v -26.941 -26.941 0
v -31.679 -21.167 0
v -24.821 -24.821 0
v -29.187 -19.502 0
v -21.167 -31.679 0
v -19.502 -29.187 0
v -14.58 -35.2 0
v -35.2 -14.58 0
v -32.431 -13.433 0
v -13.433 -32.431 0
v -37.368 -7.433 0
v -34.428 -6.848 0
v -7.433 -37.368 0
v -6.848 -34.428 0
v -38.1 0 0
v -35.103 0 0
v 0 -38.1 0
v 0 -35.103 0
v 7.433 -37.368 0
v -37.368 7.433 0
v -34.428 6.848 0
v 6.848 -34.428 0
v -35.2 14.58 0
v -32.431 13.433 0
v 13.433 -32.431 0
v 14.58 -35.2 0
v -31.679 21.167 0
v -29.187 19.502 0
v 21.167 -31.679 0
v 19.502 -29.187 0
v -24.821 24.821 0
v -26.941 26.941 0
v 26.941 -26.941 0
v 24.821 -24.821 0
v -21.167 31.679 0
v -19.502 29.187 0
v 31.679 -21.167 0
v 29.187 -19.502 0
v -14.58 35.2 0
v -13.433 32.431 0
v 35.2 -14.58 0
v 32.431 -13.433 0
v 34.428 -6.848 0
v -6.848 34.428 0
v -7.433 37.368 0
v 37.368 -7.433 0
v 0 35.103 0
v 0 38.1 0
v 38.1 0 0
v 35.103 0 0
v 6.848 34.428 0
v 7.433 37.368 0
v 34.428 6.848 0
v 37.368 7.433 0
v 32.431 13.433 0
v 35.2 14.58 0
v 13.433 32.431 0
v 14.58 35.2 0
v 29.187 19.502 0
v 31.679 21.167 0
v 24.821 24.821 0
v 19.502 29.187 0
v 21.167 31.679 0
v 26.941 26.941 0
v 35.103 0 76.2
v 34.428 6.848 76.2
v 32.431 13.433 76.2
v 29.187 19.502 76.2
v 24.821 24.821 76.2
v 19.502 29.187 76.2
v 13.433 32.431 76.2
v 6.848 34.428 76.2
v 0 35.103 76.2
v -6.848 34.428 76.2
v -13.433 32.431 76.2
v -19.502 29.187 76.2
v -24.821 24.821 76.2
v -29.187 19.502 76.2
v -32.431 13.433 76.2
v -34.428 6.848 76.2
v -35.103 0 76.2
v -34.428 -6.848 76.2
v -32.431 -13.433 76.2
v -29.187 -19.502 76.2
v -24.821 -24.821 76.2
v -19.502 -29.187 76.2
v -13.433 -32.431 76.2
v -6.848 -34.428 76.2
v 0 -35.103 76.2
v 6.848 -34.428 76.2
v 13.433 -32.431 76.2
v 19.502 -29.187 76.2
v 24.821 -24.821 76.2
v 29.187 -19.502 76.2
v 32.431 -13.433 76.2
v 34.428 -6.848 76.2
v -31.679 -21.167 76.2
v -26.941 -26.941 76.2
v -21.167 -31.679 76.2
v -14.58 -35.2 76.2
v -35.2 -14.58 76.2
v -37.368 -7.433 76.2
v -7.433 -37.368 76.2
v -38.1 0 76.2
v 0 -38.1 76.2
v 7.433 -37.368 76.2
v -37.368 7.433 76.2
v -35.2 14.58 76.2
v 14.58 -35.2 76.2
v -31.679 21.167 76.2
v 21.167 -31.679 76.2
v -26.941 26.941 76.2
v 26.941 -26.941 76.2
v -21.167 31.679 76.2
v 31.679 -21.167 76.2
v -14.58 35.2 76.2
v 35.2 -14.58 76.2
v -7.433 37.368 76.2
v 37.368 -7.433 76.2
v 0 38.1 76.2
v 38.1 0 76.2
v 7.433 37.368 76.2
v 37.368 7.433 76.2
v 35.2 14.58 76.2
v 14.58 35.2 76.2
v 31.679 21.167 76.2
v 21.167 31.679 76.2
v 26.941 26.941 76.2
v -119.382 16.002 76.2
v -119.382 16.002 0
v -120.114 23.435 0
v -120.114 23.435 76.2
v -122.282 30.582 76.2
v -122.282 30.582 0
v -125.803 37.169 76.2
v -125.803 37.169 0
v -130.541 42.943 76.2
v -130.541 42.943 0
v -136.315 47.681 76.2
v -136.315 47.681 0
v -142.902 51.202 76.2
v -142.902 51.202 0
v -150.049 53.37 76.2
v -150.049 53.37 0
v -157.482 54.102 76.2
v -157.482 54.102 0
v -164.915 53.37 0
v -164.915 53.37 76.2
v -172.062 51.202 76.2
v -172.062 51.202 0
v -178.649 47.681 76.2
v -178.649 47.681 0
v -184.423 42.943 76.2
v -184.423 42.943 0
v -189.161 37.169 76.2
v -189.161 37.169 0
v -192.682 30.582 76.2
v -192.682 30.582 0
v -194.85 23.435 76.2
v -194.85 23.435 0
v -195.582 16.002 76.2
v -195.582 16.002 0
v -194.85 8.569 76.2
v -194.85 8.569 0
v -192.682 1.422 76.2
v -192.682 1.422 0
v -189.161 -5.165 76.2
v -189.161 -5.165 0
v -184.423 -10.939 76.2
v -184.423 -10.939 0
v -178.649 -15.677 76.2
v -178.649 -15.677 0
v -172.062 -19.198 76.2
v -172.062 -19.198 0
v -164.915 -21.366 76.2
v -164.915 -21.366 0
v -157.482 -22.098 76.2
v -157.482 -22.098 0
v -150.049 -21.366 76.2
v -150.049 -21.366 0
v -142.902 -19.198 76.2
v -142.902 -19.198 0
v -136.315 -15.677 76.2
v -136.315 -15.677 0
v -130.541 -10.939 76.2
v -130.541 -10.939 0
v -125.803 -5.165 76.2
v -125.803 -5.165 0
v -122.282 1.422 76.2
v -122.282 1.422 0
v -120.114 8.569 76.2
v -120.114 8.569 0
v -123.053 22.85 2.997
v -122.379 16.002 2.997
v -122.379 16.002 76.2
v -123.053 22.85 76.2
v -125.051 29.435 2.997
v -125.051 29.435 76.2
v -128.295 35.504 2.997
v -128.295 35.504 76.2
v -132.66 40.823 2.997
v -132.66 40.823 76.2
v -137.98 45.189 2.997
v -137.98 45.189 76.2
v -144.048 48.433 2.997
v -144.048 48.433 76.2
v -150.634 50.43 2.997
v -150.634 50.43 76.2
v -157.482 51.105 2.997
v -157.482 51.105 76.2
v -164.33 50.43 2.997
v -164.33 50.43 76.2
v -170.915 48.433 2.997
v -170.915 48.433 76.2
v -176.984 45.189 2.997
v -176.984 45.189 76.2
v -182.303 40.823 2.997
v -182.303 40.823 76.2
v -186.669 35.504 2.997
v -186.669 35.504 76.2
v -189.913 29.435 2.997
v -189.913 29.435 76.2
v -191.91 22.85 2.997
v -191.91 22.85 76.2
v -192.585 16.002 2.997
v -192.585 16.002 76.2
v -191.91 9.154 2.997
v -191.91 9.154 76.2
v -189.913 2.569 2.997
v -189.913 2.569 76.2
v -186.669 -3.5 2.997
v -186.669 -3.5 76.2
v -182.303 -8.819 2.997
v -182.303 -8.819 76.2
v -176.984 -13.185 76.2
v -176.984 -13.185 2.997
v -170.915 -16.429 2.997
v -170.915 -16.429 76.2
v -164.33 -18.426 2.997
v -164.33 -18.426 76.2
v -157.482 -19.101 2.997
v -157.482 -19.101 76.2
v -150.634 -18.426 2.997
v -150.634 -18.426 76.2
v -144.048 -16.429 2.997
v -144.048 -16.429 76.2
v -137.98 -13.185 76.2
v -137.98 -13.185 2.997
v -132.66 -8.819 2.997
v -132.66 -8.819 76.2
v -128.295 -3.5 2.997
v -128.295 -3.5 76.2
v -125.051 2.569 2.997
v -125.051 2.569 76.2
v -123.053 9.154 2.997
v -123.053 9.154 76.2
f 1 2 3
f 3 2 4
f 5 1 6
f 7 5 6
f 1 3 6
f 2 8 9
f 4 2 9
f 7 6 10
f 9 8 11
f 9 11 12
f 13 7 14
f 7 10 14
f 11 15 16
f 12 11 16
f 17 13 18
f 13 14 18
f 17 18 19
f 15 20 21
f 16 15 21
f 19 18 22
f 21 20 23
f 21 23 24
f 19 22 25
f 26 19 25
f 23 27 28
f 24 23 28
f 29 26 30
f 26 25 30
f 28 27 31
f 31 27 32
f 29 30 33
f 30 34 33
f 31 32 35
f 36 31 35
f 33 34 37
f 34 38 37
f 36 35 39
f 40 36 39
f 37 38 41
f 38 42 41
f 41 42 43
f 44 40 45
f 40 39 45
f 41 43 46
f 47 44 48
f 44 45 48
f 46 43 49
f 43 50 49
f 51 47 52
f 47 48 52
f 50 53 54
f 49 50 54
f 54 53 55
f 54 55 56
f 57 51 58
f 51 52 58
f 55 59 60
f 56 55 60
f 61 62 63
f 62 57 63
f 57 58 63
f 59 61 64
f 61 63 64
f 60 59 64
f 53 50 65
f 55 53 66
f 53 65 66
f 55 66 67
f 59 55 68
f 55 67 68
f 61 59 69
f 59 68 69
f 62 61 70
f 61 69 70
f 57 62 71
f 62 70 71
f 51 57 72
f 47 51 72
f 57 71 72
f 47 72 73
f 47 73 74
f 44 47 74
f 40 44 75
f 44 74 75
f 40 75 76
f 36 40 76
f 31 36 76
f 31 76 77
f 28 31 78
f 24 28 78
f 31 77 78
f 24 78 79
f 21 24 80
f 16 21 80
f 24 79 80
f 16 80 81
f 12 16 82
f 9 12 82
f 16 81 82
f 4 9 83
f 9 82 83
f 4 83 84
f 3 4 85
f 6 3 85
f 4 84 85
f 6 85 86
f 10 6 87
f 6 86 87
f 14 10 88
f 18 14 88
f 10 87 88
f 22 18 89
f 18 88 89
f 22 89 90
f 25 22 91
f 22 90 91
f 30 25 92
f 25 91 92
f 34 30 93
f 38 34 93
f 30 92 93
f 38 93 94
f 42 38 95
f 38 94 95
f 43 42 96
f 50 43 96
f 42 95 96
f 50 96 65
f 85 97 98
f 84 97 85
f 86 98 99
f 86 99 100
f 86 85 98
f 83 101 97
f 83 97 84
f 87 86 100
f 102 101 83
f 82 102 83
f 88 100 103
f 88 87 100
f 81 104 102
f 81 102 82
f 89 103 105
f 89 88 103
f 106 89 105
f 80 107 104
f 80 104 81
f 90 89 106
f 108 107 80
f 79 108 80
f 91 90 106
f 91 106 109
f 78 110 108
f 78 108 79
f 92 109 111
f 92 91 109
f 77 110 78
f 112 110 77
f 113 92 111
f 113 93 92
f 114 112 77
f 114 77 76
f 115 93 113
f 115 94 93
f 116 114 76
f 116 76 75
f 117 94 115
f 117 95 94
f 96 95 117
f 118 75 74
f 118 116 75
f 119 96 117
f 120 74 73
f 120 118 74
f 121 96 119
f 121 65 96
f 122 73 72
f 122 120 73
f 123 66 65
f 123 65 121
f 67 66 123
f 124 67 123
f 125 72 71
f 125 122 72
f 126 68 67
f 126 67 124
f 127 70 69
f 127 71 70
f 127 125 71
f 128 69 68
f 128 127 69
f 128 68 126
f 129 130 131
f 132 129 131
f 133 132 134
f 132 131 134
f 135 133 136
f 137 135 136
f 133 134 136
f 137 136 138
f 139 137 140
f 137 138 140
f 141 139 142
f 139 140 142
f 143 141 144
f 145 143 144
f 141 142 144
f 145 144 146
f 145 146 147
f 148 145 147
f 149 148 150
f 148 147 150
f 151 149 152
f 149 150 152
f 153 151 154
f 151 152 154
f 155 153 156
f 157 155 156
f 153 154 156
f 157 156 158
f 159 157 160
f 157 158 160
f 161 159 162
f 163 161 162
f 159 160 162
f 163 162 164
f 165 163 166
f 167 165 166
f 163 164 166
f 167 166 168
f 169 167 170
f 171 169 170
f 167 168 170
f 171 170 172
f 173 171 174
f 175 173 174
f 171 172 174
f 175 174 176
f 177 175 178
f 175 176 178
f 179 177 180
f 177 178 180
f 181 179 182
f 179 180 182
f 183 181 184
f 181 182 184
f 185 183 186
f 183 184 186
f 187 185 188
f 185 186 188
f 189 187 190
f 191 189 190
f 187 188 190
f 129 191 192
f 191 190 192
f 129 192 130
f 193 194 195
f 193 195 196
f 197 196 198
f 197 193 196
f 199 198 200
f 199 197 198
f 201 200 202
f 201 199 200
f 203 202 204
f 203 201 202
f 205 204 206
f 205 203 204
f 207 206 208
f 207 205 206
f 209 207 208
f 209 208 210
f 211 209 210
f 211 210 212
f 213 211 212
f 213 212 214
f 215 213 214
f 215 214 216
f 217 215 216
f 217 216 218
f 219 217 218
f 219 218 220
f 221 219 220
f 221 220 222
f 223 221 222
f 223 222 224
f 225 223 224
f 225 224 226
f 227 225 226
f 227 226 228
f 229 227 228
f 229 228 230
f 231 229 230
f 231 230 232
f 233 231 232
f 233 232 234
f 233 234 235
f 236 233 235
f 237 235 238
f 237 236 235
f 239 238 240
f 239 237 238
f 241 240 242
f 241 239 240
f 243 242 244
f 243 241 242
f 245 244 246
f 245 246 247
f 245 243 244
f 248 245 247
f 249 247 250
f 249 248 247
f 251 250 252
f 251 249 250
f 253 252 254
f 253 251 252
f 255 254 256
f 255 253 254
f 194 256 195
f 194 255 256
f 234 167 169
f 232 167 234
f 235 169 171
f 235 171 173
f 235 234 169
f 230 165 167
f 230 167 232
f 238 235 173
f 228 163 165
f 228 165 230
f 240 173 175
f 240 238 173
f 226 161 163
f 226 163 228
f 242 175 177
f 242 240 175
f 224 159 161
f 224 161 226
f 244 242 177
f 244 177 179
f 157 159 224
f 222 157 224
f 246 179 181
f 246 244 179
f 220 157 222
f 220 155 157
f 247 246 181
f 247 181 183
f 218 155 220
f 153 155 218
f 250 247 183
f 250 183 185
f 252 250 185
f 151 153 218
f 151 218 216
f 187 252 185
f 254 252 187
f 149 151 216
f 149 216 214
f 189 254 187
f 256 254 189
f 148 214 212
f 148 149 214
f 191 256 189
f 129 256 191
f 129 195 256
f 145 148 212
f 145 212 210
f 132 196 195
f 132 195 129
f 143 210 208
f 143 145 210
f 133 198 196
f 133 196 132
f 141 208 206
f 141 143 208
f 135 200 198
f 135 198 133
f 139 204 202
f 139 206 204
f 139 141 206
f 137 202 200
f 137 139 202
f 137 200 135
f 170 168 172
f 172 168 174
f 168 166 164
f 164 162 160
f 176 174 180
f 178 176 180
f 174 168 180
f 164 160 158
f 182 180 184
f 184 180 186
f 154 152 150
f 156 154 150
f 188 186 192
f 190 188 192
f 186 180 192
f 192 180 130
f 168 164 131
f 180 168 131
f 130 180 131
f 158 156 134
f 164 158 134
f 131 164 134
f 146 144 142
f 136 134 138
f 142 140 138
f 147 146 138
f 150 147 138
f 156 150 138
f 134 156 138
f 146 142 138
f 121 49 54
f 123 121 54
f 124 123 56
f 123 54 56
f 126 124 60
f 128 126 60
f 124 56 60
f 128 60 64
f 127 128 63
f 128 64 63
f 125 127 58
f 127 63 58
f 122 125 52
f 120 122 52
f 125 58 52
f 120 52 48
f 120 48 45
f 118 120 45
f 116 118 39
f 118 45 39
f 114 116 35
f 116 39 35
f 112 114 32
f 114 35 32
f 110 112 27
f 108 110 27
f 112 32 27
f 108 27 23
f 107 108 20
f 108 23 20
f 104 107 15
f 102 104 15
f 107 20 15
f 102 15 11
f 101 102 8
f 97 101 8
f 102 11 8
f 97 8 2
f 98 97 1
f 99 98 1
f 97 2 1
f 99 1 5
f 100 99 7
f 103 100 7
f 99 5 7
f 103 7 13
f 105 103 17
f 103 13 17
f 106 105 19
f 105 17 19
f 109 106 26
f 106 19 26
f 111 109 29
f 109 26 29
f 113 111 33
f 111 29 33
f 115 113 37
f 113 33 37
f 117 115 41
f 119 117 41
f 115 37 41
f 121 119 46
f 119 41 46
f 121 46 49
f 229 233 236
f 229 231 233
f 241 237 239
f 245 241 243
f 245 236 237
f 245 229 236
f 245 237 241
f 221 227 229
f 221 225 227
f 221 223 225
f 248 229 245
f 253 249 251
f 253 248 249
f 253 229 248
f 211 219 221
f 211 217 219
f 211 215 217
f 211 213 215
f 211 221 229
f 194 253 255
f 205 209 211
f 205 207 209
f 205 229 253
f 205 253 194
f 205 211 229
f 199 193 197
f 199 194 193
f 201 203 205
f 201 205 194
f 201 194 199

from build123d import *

# Parameters (mm, degrees)
F0_R     = 38.1
F1_DEPTH = 76.2
F2_R     = 38.1
F3_DEPTH = 76.2
F4_T     = -2.9972
F5_T     = -2.9972
F6_R     = 35.1028
F7_DEPTH = 25.4


with BuildPart() as f1:
    # F0 (on Top) → F1 (new body)
    with BuildSketch(Plane.XY):
        Circle(F0_R)
    extrude(amount=F1_DEPTH)

    # F5
    f5_openings = [f1.faces().sort_by_distance(p)[0] for p in [
        (0, 0, 76.2),
    ]]
    offset(amount=F5_T, openings=f5_openings)

    # F6 (on face) → F7 (cut)
    with BuildSketch(Plane.XY.offset(2.9972)):
        Circle(F6_R)
    extrude(amount=-F7_DEPTH, mode=Mode.SUBTRACT)


with BuildPart() as f3:
    # F2 (on Top) → F3 (new body)
    with BuildSketch(Plane.XY):
        with Locations((-157.4817597866, 16.0020012408)):
            Circle(F2_R)
    extrude(amount=F3_DEPTH)

    # F4
    f4_openings = [f3.faces().sort_by_distance(p)[0] for p in [
        (-157.48176, 16.002001, 76.2),
    ]]
    offset(amount=F4_T, openings=f4_openings)


solid = Compound([f1.part, f3.part])
